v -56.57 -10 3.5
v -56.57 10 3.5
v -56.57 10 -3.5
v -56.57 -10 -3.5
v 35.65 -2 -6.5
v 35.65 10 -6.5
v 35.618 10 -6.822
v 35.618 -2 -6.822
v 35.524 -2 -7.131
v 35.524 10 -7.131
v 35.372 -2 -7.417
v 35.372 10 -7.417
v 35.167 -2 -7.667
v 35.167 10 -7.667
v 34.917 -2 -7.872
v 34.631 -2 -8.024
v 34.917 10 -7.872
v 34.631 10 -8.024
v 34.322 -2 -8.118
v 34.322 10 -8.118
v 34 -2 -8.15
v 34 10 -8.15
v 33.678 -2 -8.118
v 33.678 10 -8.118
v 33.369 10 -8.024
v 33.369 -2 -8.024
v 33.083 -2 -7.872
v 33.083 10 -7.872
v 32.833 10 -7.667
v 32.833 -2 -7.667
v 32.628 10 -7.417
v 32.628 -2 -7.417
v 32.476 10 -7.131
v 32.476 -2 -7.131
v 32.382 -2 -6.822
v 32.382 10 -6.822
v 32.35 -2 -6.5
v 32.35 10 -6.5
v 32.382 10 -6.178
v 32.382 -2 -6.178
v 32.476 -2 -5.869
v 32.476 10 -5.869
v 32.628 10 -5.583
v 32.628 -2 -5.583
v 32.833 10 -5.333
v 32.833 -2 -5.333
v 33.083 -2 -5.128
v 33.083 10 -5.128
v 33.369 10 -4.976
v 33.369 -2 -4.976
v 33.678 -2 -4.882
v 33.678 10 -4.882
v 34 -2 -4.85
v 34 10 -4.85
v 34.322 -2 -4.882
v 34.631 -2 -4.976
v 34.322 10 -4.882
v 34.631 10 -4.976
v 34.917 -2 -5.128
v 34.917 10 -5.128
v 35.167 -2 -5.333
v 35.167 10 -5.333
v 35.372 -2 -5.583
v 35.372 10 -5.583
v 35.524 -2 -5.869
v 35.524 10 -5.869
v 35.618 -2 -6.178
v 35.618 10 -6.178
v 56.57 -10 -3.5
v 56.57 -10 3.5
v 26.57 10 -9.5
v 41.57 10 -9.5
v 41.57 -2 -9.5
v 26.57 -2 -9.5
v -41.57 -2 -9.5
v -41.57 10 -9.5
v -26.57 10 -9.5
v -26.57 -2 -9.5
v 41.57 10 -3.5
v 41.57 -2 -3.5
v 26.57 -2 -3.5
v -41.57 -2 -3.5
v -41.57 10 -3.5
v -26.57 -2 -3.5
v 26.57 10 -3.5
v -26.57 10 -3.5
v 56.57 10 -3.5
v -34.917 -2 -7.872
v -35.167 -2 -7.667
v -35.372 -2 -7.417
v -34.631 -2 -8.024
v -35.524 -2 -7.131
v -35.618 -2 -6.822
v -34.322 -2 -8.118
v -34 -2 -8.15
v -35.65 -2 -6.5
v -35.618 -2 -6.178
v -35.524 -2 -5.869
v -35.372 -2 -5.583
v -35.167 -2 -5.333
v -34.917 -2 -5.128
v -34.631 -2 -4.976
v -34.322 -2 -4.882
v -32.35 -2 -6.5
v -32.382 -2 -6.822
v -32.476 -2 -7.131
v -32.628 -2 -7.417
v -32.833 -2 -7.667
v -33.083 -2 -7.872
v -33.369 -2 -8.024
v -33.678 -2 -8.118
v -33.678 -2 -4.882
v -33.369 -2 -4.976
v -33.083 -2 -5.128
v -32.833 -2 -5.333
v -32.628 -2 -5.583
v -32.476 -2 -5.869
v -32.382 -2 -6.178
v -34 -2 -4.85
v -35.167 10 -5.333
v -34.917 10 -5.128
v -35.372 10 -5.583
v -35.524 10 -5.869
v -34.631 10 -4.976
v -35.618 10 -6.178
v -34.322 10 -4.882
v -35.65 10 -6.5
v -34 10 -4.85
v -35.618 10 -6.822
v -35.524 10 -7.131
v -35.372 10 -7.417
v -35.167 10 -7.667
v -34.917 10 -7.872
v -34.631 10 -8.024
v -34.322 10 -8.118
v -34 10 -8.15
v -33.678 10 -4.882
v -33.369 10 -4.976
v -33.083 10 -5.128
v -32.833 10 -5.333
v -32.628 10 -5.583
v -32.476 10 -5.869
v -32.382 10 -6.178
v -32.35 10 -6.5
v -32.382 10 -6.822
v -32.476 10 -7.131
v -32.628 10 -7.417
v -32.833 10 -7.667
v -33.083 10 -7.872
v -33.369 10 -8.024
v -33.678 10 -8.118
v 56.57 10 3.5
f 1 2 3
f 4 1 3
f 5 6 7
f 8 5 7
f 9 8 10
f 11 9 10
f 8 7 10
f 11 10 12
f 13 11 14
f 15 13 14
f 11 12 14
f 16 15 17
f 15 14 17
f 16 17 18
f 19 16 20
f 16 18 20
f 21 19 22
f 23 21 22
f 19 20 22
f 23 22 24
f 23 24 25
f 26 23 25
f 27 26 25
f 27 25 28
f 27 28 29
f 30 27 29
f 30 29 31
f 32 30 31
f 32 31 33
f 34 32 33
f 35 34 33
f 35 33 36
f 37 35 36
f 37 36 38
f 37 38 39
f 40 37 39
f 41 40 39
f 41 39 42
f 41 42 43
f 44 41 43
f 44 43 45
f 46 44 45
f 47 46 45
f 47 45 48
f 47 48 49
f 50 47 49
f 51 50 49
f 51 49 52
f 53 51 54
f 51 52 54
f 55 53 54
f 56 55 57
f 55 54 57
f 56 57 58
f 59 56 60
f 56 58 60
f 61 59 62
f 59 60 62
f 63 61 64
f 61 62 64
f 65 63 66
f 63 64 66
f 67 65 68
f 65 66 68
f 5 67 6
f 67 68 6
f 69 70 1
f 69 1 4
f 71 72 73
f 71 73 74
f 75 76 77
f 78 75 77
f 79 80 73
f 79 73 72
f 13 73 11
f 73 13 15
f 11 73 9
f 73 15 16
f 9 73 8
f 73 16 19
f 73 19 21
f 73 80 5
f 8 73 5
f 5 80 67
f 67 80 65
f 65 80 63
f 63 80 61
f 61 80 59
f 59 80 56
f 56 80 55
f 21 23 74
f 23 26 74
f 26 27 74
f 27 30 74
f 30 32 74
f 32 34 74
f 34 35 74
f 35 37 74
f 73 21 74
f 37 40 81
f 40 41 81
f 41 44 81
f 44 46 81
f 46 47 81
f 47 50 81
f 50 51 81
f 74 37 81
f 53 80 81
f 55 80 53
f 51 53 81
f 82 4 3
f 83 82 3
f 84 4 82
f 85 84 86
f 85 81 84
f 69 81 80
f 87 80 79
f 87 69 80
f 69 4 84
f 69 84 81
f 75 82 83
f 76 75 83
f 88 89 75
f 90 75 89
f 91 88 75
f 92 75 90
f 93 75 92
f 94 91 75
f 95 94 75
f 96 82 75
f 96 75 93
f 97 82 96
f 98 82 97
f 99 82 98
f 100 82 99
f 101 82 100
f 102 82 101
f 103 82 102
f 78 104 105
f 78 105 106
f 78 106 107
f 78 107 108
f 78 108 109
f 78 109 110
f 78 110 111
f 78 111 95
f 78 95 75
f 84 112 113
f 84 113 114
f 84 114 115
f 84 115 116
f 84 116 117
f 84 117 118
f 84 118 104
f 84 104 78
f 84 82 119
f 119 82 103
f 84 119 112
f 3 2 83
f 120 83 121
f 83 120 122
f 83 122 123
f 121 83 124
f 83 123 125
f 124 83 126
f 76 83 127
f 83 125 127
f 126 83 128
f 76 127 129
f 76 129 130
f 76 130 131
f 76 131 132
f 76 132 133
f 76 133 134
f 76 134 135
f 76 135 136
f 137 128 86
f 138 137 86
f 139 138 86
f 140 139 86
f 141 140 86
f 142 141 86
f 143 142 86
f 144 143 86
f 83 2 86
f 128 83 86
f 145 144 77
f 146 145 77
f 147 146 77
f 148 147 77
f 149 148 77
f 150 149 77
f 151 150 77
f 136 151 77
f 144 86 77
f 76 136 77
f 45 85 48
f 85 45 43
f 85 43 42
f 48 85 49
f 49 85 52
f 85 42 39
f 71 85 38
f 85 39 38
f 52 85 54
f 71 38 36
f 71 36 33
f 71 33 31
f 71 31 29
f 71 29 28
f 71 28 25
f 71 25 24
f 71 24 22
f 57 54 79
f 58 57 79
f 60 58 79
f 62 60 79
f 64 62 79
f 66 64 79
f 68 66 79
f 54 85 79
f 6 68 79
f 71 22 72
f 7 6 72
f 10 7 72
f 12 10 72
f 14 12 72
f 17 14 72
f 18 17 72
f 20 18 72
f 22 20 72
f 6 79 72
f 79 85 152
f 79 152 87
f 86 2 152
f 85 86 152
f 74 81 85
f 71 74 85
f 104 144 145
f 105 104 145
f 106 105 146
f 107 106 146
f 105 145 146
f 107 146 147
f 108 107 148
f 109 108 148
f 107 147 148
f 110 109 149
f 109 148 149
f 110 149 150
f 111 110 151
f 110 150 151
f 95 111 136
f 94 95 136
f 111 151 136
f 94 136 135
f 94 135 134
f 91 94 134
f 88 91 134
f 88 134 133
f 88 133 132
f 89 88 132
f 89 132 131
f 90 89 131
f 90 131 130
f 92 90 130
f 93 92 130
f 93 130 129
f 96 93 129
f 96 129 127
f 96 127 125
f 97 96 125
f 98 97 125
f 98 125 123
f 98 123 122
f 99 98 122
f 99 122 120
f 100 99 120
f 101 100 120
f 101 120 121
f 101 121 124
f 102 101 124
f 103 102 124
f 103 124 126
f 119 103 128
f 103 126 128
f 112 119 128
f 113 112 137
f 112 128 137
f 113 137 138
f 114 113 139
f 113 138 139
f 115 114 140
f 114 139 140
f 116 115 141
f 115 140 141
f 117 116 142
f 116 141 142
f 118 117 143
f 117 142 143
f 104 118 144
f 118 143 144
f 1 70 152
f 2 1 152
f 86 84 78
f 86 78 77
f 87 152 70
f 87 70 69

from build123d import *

# Parameters (mm, degrees)
SKETCH_1_W         = 7
SKETCH_1_H         = 20
EXTRUDE_1_DEPTH    = 56.57
SKETCH_2_W         = 15
SKETCH_2_H         = 12
EXTRUDE_2_DEPTH    = 6
HOLE_WIZARD_M4_1_D = 3.3


with BuildPart() as part:
    # 草图1 → 凸台-拉伸1 (new, symmetric)
    with BuildSketch(Plane(origin=(0, 0, 0), x_dir=(0, 0, -1), z_dir=(1, 0, 0))):
        Rectangle(SKETCH_1_W, SKETCH_1_H)
    extrude(amount=EXTRUDE_1_DEPTH, both=True)

    # 草图2 → 凸台-拉伸2 (add)
    with BuildSketch(Plane(origin=(0, 0, -3.5), x_dir=(-1, 0, 0), z_dir=(0, 0, -1))):
        with Locations((-34.07, 4)):
            Rectangle(SKETCH_2_W, SKETCH_2_H)
    extrude_2 = extrude(amount=EXTRUDE_2_DEPTH)

    # 镜向1: 凸台-拉伸2 across plane
    add(extrude_2.mirror(Plane(origin=(0, 0, 0), x_dir=(0, 0, 1), z_dir=(1, 0, 0))))

    # M4 螺纹孔1 (through all)
    with Locations(Plane(origin=(0, -2, 0), x_dir=(-1, 0, 0), z_dir=(0, -1, 0))):
        with Locations((34, 6.5), (-34, 6.5)):
            Hole(HOLE_WIZARD_M4_1_D / 2)


solid = part.part
